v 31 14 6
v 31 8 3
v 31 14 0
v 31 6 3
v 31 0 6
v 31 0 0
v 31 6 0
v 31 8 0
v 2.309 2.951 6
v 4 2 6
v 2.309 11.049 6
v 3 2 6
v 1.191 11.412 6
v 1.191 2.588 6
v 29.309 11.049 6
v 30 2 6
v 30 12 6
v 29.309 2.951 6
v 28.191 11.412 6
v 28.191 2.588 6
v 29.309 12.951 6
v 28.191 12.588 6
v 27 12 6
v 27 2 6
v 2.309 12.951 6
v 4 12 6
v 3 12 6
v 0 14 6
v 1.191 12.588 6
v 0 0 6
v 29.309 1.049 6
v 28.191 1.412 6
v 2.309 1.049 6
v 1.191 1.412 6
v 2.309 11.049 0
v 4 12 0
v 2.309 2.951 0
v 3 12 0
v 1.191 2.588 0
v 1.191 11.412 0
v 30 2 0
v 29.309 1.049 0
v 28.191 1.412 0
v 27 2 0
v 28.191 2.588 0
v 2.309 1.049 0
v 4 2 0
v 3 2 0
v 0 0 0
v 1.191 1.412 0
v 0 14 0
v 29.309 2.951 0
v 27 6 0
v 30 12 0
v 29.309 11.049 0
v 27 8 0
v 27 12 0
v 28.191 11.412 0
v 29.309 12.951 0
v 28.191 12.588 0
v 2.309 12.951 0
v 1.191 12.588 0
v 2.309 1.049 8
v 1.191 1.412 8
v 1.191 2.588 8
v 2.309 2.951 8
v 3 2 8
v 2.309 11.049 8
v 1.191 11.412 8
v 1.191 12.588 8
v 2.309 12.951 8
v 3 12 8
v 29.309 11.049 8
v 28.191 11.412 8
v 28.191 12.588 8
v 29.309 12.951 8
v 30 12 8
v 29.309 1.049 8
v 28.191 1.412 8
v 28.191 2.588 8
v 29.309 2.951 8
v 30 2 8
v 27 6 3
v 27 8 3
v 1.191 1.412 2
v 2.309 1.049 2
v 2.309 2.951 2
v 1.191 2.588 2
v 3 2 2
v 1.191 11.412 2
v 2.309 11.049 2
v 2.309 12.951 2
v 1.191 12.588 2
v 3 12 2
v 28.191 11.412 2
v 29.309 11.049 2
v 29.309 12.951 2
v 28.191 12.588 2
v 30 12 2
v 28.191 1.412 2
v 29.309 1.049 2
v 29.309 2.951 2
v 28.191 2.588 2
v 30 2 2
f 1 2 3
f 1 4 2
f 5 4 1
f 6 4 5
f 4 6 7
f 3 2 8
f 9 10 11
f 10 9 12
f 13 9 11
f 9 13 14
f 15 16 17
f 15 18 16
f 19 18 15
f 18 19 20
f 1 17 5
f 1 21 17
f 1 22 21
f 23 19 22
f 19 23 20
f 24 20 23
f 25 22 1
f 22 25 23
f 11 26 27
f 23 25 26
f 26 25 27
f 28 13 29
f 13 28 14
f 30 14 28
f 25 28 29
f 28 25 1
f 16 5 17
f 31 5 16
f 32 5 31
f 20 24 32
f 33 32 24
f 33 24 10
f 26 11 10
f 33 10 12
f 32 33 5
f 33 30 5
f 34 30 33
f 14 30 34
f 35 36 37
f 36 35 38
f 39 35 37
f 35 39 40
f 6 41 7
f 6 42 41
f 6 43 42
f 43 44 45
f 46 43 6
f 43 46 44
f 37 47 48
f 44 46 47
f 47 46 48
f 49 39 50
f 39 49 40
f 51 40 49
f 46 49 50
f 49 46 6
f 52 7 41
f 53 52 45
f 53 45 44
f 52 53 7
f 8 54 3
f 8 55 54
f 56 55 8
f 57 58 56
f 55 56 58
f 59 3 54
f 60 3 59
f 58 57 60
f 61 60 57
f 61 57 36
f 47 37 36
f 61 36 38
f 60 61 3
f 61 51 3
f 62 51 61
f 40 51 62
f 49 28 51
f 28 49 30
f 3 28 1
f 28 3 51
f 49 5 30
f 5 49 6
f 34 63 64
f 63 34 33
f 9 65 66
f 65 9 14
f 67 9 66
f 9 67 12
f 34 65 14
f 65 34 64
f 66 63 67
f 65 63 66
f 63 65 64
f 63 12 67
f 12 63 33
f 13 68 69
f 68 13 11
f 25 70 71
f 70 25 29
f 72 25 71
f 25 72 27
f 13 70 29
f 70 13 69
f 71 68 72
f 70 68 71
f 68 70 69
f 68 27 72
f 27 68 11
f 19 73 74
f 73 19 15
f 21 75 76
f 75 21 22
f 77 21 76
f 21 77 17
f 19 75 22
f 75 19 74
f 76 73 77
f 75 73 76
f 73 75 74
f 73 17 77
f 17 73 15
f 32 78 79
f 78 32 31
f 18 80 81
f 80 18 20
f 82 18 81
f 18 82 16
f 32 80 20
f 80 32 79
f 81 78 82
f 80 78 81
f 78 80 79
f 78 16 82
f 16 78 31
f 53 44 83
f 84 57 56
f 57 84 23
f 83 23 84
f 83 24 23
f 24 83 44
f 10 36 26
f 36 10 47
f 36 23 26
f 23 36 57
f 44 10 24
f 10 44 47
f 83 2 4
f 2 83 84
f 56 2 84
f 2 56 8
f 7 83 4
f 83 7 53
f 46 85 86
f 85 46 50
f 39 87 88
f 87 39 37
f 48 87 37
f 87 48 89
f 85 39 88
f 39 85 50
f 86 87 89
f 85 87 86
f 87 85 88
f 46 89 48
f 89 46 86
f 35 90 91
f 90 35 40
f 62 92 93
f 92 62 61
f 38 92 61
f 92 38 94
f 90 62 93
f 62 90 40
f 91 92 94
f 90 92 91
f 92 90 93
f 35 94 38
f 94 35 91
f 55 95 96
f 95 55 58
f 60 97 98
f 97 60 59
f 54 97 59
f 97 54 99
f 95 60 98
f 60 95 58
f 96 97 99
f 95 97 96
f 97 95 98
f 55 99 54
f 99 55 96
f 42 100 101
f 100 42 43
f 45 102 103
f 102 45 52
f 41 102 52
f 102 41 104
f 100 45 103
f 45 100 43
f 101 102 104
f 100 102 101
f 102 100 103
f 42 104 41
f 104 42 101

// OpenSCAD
module metered_section() {
	difference() {
		union() {
			// main box
			cube([31,14,6]);
			// the pins
			translate([2, 2, 7])
				cylinder(h = 2, r1 = 1, r2 = 1, center = true);
			translate([2, 12, 7])
				cylinder(h = 2, r1 = 1, r2 = 1, center = true);
			translate([29, 12, 7])
				cylinder(h = 2, r1 = 1, r2 = 1, center = true);
			translate([29, 2, 7])
				cylinder(h = 2, r1 = 1, r2 = 1, center = true);
		}
		// main slide chamber
		translate([4, 2, 0])
			cube([23,10,8]);
		// slide pull hole
		translate([27, 6, 0])
			cube([4,2,3]);
		// the pin holes
		translate([2, 2, 0])
			cylinder(h = 4, r1 = 1, r2 = 1, center = true);
		translate([2, 12, 0])
			cylinder(h = 4, r1 = 1, r2 = 1, center = true);
		translate([29, 12, 0])
			cylinder(h = 4, r1 = 1, r2 = 1, center = true);
		translate([29, 2, 0])
			cylinder(h = 4, r1 = 1, r2 = 1, center = true);
	}
}
metered_section();
